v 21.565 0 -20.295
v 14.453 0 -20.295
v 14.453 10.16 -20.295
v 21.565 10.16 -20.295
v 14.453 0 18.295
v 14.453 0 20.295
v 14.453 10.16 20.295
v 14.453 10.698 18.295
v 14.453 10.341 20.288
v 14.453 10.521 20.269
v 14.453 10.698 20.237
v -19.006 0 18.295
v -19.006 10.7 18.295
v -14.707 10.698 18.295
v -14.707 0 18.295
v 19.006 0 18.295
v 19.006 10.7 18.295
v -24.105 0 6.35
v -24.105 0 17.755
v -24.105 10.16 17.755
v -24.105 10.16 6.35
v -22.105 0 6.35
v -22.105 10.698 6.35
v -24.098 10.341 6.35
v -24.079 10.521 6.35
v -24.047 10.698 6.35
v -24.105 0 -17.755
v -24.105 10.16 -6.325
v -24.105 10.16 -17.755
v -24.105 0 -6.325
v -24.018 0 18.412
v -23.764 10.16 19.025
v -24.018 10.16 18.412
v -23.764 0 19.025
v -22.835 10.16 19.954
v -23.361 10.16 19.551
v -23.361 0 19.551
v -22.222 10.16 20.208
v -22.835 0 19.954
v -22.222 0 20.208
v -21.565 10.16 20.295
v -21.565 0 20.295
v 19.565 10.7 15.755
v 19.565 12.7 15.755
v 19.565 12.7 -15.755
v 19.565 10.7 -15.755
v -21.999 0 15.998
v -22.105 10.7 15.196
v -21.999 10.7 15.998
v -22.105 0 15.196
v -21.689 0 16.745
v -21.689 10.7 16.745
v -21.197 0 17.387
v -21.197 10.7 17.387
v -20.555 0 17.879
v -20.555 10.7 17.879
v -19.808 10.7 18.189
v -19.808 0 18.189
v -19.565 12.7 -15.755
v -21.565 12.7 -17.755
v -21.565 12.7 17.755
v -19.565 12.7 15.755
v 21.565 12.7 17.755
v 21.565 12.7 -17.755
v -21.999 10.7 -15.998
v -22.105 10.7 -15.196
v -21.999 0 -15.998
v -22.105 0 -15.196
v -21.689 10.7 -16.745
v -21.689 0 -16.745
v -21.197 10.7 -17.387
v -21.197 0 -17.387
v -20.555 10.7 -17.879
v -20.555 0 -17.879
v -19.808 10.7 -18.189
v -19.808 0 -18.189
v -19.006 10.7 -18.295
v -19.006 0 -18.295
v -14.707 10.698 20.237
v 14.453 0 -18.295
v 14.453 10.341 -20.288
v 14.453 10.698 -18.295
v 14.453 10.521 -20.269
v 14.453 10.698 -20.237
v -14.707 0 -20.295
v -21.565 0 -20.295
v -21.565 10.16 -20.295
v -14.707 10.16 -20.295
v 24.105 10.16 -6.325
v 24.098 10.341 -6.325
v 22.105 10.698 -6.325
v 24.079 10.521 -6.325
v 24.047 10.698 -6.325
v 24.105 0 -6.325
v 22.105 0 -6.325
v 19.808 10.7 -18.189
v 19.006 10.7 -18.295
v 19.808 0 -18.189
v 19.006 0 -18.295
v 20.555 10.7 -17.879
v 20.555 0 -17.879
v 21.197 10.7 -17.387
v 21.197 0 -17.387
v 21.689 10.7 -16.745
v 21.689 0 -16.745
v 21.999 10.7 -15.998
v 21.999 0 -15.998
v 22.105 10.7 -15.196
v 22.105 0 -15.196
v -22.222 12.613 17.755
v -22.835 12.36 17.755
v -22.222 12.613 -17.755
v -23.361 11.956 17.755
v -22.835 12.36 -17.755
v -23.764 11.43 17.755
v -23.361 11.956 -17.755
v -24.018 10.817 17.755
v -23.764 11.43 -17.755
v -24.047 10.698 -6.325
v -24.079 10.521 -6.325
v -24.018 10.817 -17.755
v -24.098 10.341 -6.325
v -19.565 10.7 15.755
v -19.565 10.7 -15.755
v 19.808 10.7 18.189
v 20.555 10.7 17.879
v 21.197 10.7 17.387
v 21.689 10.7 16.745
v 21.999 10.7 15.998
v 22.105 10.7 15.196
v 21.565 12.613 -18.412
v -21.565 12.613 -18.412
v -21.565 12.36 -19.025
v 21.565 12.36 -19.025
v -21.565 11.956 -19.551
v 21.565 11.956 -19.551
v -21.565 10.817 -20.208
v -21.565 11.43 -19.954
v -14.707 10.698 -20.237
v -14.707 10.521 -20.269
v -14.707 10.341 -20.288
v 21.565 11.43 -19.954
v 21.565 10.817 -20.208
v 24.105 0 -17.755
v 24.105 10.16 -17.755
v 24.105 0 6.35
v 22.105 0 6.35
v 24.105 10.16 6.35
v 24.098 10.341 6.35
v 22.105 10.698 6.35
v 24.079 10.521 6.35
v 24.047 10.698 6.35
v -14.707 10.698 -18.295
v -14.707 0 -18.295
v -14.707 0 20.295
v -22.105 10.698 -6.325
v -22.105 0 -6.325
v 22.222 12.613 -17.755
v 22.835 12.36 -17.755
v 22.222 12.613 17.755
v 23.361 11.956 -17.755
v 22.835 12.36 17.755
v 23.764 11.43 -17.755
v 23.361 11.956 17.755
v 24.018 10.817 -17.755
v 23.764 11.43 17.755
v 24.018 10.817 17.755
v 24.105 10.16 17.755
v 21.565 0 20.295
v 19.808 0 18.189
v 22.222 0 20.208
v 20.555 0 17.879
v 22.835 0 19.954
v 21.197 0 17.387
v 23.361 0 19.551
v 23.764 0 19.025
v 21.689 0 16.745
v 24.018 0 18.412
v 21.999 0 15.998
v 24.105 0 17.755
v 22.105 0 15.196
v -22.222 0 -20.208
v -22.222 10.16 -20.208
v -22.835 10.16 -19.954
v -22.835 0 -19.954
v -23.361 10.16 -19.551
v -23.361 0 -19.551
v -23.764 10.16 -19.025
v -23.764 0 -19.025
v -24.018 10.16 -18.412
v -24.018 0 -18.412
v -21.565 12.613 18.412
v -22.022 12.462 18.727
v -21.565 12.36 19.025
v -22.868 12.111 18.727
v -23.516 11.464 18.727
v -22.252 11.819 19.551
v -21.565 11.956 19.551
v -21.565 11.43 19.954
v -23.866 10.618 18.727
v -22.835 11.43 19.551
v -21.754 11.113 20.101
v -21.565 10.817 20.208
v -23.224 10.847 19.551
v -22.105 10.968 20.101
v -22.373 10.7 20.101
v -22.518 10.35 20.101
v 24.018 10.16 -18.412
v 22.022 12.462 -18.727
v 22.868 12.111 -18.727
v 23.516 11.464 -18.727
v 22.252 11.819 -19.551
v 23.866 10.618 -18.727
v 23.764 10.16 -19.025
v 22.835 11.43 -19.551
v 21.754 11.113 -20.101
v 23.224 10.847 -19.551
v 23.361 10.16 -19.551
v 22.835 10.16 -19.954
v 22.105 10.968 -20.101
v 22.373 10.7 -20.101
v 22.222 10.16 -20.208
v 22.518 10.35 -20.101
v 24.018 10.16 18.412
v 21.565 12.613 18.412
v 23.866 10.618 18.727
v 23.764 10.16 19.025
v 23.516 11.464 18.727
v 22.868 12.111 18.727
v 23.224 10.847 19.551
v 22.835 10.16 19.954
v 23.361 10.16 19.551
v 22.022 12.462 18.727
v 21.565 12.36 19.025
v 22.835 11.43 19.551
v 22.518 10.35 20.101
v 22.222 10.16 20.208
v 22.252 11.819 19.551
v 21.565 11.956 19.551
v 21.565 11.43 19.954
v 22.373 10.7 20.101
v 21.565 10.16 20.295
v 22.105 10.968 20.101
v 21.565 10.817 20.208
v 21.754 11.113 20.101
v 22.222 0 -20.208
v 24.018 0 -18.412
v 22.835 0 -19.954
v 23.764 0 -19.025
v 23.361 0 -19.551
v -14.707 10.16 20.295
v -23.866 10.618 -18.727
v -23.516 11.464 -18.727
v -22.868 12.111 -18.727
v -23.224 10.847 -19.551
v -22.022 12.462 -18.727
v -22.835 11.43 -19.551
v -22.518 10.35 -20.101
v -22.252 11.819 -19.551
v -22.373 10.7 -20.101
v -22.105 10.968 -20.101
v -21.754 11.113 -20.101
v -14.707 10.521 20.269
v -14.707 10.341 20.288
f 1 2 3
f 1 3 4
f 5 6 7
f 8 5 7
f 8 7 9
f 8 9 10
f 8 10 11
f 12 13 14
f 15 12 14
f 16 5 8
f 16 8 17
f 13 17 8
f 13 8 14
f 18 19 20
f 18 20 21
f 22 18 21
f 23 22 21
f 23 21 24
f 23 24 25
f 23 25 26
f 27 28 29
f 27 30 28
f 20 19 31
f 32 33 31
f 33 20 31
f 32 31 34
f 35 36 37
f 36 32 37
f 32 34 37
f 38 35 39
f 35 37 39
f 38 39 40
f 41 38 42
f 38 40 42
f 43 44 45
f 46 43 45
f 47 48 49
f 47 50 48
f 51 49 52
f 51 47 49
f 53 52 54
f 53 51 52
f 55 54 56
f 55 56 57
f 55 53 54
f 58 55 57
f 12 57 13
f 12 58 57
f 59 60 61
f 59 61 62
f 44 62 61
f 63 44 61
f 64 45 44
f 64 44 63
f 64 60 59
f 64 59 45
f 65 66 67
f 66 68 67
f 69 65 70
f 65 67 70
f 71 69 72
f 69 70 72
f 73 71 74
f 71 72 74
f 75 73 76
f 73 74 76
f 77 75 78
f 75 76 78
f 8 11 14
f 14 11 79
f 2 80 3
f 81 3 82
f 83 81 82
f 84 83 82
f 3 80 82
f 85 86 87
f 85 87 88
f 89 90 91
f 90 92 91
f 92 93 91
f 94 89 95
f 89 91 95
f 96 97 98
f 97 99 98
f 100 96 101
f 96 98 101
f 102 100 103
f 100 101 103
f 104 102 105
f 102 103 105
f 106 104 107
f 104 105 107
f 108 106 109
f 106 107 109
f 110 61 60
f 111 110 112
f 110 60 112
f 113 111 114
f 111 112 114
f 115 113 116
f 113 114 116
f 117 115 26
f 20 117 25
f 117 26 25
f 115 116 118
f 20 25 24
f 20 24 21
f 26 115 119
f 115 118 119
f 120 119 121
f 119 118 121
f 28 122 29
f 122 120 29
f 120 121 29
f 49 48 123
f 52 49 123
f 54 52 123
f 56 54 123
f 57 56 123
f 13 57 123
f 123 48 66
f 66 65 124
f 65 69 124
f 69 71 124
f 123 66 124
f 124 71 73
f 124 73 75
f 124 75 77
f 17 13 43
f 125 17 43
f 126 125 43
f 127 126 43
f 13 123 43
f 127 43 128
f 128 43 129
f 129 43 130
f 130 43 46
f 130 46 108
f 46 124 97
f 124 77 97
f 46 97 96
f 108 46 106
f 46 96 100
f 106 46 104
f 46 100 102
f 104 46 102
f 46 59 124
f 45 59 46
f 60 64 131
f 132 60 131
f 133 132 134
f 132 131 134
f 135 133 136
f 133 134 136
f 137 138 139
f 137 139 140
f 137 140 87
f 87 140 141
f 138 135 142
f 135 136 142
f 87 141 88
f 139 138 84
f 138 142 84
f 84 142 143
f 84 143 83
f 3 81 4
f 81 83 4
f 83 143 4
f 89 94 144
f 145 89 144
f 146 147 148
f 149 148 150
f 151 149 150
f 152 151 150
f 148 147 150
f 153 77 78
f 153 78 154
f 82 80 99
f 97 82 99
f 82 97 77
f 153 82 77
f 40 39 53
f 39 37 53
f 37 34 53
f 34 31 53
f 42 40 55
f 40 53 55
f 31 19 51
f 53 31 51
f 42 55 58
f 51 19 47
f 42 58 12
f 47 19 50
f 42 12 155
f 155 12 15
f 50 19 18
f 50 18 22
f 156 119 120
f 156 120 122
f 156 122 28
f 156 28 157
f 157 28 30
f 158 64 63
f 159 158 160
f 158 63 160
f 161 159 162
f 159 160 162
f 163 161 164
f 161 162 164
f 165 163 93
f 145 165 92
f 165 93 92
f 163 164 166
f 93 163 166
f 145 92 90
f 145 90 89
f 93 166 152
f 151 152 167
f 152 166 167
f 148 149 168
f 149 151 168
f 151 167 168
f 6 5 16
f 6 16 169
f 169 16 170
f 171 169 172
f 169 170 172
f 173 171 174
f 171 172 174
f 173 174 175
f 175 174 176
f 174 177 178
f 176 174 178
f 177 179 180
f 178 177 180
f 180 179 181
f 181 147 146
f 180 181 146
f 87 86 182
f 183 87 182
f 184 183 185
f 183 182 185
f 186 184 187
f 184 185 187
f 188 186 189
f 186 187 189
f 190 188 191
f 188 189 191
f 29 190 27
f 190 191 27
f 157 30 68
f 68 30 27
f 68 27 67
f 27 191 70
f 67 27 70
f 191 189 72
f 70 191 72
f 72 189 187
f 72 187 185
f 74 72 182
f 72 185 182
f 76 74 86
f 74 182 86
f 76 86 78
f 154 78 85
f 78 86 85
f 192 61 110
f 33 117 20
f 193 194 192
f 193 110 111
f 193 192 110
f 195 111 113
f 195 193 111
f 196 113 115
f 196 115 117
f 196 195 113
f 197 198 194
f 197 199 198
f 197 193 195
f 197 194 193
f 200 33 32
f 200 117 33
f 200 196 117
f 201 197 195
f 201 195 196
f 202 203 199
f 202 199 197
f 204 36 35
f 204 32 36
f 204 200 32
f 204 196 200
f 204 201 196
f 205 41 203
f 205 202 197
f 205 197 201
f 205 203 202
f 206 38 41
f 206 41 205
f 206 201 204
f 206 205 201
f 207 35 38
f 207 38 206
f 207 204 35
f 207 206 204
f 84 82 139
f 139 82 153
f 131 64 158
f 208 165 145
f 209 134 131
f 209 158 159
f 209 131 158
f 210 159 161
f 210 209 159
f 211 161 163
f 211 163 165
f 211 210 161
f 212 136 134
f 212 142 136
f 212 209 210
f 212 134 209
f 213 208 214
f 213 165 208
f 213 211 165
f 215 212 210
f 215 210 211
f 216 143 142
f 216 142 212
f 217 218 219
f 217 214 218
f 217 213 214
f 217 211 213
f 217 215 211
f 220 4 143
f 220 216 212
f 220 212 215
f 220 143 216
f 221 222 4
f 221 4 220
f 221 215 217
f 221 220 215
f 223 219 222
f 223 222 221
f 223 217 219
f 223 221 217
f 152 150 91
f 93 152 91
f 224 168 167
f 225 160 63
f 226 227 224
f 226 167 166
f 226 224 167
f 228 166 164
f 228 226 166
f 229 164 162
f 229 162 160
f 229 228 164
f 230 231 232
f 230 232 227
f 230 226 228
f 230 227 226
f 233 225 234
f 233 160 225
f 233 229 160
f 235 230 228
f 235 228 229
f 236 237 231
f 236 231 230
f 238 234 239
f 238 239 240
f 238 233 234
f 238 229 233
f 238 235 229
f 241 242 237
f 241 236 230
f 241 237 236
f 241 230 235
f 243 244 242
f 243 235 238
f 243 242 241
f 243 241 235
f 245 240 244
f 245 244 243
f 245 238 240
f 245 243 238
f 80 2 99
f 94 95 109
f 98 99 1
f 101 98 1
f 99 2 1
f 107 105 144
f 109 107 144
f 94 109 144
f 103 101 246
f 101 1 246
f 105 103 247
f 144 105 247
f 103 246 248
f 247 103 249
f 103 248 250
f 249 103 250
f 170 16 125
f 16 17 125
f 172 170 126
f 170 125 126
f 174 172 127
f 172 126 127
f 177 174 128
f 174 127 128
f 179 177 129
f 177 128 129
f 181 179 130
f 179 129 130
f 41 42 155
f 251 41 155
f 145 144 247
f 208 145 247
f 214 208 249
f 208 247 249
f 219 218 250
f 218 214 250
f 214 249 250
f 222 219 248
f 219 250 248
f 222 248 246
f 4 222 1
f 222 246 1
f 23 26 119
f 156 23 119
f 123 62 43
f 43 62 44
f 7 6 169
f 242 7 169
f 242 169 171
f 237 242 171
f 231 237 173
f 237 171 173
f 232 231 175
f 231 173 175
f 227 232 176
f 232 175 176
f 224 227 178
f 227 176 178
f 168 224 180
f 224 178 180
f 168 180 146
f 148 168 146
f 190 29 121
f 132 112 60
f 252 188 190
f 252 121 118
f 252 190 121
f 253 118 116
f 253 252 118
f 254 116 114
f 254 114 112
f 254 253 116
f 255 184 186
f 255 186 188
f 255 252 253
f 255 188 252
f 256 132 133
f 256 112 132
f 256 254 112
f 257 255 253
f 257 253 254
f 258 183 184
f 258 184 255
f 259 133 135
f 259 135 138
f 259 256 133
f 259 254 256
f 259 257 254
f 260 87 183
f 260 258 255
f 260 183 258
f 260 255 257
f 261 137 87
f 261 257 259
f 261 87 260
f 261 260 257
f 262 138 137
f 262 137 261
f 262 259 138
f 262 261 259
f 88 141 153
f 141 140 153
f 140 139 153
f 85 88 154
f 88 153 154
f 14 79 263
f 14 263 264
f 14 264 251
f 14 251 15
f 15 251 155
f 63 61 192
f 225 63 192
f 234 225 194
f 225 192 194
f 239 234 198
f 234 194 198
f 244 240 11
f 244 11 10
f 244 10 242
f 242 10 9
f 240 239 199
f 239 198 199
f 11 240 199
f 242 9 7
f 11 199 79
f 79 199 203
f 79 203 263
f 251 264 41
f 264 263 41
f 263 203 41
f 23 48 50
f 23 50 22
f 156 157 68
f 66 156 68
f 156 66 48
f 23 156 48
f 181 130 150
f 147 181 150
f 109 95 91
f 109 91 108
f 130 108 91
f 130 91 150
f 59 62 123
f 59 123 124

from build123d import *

# Parameters (mm, degrees)
SKETCH1_W           = 48.2092
SKETCH1_H           = 40.5892
BOSS_EXTRUDE1_DEPTH = 12.7
SHELL1_T            = -2
CUT_EXTRUDE2_DEPTH  = 68.58
FILLET6_R           = 2.54
FILLET7_R           = 2.54
FILLET8_R           = 2.54
FILLET9_R           = 2.54
FILLET10_R          = 2.54
SKETCH6_W           = 39.1292
SKETCH6_H           = 31.5092
CUT_EXTRUDE4_DEPTH  = 68.58
CUT_EXTRUDE5_DEPTH  = 49.276
FILLET19_R          = 3.0988


with BuildPart() as part:
    # Sketch1 → Boss-Extrude1 (new body)
    with BuildSketch(Plane(origin=(0, 0, 0), x_dir=(1, 0, 0), z_dir=(0, 1, 0))):
        Rectangle(SKETCH1_W, SKETCH1_H)
    extrude(amount=BOSS_EXTRUDE1_DEPTH)

    # Shell1
    shell1_openings = [part.faces().sort_by_distance(p)[0] for p in [
        (0, 0, 0),
    ]]
    offset(amount=SHELL1_T, openings=shell1_openings, kind=Kind.INTERSECTION)

    # Sketch4 → Cut-Extrude2 (cut)
    with BuildSketch(Plane.ZY.offset(24.1046)):
        Polygon((0, 0), (6.35, 0), (6.35, 10.69848), (-6.3246, 10.69848), (-6.3246, 0), align=None)
    extrude(amount=-CUT_EXTRUDE2_DEPTH, mode=Mode.SUBTRACT)

    # Fillet6
    # the kernel refuses this fillet: 2.54 mm, written as the material it takes off along each edge
    with BuildSketch(Plane(origin=(30.4546, 12.7, -20.2946), x_dir=(0, -1, 0), z_dir=(-1, 0, 0))) as fillet6_piece_1:
        with BuildLine():
            CenterArc((FILLET6_R, FILLET6_R), FILLET6_R, 180, 90)
            Line((0, FILLET6_R), (0, 0))
            Line((0, 0), (FILLET6_R, 0))
        make_face()
    extrude(amount=60.9092, mode=Mode.SUBTRACT)
    with BuildSketch(Plane(origin=(24.1046, 12.7, 26.6446), x_dir=(0, -1, 0), z_dir=(0, 0, -1)), Plane(origin=(-24.1046, 12.7, -26.6446), x_dir=(0, -1, 0), z_dir=(0, 0, 1))) as fillet6_piece_2:
        with BuildLine():
            CenterArc((FILLET6_R, FILLET6_R), FILLET6_R, 180, 90)
            Line((0, FILLET6_R), (0, 0))
            Line((0, 0), (FILLET6_R, 0))
        make_face()
    extrude(amount=53.2892, mode=Mode.SUBTRACT)
    with BuildSketch(Plane(origin=(-30.4546, 12.7, 20.2946), x_dir=(0, 0, -1), z_dir=(1, 0, 0))) as fillet6_piece_3:
        with BuildLine():
            CenterArc((FILLET6_R, -FILLET6_R), FILLET6_R, 90, 90)
            Line((0, -FILLET6_R), (0, 0))
            Line((0, 0), (FILLET6_R, 0))
        make_face()
    extrude(amount=60.9092, mode=Mode.SUBTRACT)

    # Fillet7
    # the kernel refuses this fillet: 2.54 mm, written as the material it takes off along each edge
    with BuildSketch(Plane(origin=(-21.5646, 10.16, -17.7546), x_dir=(-1, 0, 0), z_dir=(0, 0, -1))) as fillet7_piece_1_section:
        Polygon((0, 0), (FILLET7_R, 0), (FILLET7_R, FILLET7_R), (0, FILLET7_R), align=None)
    fillet7_piece_1 = extrude(amount=FILLET7_R, mode=Mode.PRIVATE)
    fillet7_piece_1 = fillet7_piece_1 - Plane(origin=(-21.5646, 10.16, -17.7546), x_dir=(0.7071067811865475, -0.7071067811865475, 0), z_dir=(0, 0, -1)) * Sphere(FILLET7_R, mode=Mode.PRIVATE)
    add(fillet7_piece_1, mode=Mode.SUBTRACT)
    with BuildSketch(Plane(origin=(-24.1046, -6.35, -20.2946), x_dir=(1, 0, 0), z_dir=(0, 1, 0))) as fillet7_piece_2:
        with BuildLine():
            CenterArc((FILLET7_R, -FILLET7_R), FILLET7_R, 90, 90)
            Line((0, -FILLET7_R), (0, 0))
            Line((0, 0), (FILLET7_R, 0))
        make_face()
    extrude(amount=16.51, mode=Mode.SUBTRACT)

    # Fillet8
    # the kernel refuses this fillet: 2.54 mm, written as the material it takes off along each edge
    with BuildSketch(Plane(origin=(-21.5646, 10.16, 17.7546), x_dir=(-1, 0, 0), z_dir=(0, 0, 1))) as fillet8_piece_1_section:
        Polygon((0, 0), (FILLET8_R, 0), (FILLET8_R, -FILLET8_R), (0, -FILLET8_R), align=None)
    fillet8_piece_1 = extrude(amount=FILLET8_R, mode=Mode.PRIVATE)
    fillet8_piece_1 = fillet8_piece_1 - Plane(origin=(-21.5646, 10.16, 17.7546), x_dir=(0.7071067811865475, -0.7071067811865475, 0), z_dir=(0, 0, 1)) * Sphere(FILLET8_R, mode=Mode.PRIVATE)
    add(fillet8_piece_1, mode=Mode.SUBTRACT)
    with BuildSketch(Plane(origin=(-24.1046, -6.35, 20.2946), x_dir=(1, 0, 0), z_dir=(0, 1, 0))) as fillet8_piece_2:
        with BuildLine():
            CenterArc((FILLET8_R, FILLET8_R), FILLET8_R, 180, 90)
            Line((0, FILLET8_R), (0, 0))
            Line((0, 0), (FILLET8_R, 0))
        make_face()
    extrude(amount=16.51, mode=Mode.SUBTRACT)

    # Fillet9
    # the kernel refuses this fillet: 2.54 mm, written as the material it takes off along each edge
    with BuildSketch(Plane(origin=(21.5646, 10.16, -17.7546), x_dir=(1, 0, 0), z_dir=(0, 0, -1))) as fillet9_piece_1_section:
        Polygon((0, 0), (FILLET9_R, 0), (FILLET9_R, -FILLET9_R), (0, -FILLET9_R), align=None)
    fillet9_piece_1 = extrude(amount=FILLET9_R, mode=Mode.PRIVATE)
    fillet9_piece_1 = fillet9_piece_1 - Plane(origin=(21.5646, 10.16, -17.7546), x_dir=(-0.7071067811865475, -0.7071067811865475, 0), z_dir=(0, 0, -1)) * Sphere(FILLET9_R, mode=Mode.PRIVATE)
    add(fillet9_piece_1, mode=Mode.SUBTRACT)
    with BuildSketch(Plane(origin=(24.1046, -6.35, -20.2946), x_dir=(-1, 0, 0), z_dir=(0, 1, 0))) as fillet9_piece_2:
        with BuildLine():
            CenterArc((FILLET9_R, FILLET9_R), FILLET9_R, 180, 90)
            Line((0, FILLET9_R), (0, 0))
            Line((0, 0), (FILLET9_R, 0))
        make_face()
    extrude(amount=16.51, mode=Mode.SUBTRACT)

    # Fillet10
    # the kernel refuses this fillet: 2.54 mm, written as the material it takes off along each edge
    with BuildSketch(Plane(origin=(21.5646, 10.16, 17.7546), x_dir=(1, 0, 0), z_dir=(0, 0, 1))) as fillet10_piece_1_section:
        Polygon((0, 0), (FILLET10_R, 0), (FILLET10_R, FILLET10_R), (0, FILLET10_R), align=None)
    fillet10_piece_1 = extrude(amount=FILLET10_R, mode=Mode.PRIVATE)
    fillet10_piece_1 = fillet10_piece_1 - Plane(origin=(21.5646, 10.16, 17.7546), x_dir=(-0.7071067811865475, -0.7071067811865475, 0), z_dir=(0, 0, 1)) * Sphere(FILLET10_R, mode=Mode.PRIVATE)
    add(fillet10_piece_1, mode=Mode.SUBTRACT)
    with BuildSketch(Plane(origin=(24.1046, -6.35, 20.2946), x_dir=(-1, 0, 0), z_dir=(0, 1, 0))) as fillet10_piece_2:
        with BuildLine():
            CenterArc((FILLET10_R, -FILLET10_R), FILLET10_R, 90, 90)
            Line((0, -FILLET10_R), (0, 0))
            Line((0, 0), (FILLET10_R, 0))
        make_face()
    extrude(amount=16.51, mode=Mode.SUBTRACT)

    # Sketch6 → Cut-Extrude4 (cut)
    with BuildSketch(Plane(origin=(0, 12.7, 0), x_dir=(1, 0, 0), z_dir=(0, 1, 0))):
        Rectangle(SKETCH6_W, SKETCH6_H)
    extrude(amount=-CUT_EXTRUDE4_DEPTH, mode=Mode.SUBTRACT)

    # Sketch3 → Cut-Extrude5 (cut)
    with BuildSketch(Plane.XY.offset(20.2946)):
        Polygon((14.4526, 10.69848), (-12.1666, 10.69848), (-14.7066, 10.69848), (-14.7066, 0), (14.4526, 0), align=None)
    extrude(amount=-CUT_EXTRUDE5_DEPTH, mode=Mode.SUBTRACT)

    # Fillet19
    fillet19_edges = [part.edges().sort_by_distance(p)[0] for p in [
        (-22.1046, 5.35, -18.2946),
        (-22.1046, 5.35, 18.2946),
        (22.1046, 5.35, 18.2946),
        (22.1046, 5.35, -18.2946),
    ]]
    fillet(fillet19_edges, radius=FILLET19_R)


solid = part.part
